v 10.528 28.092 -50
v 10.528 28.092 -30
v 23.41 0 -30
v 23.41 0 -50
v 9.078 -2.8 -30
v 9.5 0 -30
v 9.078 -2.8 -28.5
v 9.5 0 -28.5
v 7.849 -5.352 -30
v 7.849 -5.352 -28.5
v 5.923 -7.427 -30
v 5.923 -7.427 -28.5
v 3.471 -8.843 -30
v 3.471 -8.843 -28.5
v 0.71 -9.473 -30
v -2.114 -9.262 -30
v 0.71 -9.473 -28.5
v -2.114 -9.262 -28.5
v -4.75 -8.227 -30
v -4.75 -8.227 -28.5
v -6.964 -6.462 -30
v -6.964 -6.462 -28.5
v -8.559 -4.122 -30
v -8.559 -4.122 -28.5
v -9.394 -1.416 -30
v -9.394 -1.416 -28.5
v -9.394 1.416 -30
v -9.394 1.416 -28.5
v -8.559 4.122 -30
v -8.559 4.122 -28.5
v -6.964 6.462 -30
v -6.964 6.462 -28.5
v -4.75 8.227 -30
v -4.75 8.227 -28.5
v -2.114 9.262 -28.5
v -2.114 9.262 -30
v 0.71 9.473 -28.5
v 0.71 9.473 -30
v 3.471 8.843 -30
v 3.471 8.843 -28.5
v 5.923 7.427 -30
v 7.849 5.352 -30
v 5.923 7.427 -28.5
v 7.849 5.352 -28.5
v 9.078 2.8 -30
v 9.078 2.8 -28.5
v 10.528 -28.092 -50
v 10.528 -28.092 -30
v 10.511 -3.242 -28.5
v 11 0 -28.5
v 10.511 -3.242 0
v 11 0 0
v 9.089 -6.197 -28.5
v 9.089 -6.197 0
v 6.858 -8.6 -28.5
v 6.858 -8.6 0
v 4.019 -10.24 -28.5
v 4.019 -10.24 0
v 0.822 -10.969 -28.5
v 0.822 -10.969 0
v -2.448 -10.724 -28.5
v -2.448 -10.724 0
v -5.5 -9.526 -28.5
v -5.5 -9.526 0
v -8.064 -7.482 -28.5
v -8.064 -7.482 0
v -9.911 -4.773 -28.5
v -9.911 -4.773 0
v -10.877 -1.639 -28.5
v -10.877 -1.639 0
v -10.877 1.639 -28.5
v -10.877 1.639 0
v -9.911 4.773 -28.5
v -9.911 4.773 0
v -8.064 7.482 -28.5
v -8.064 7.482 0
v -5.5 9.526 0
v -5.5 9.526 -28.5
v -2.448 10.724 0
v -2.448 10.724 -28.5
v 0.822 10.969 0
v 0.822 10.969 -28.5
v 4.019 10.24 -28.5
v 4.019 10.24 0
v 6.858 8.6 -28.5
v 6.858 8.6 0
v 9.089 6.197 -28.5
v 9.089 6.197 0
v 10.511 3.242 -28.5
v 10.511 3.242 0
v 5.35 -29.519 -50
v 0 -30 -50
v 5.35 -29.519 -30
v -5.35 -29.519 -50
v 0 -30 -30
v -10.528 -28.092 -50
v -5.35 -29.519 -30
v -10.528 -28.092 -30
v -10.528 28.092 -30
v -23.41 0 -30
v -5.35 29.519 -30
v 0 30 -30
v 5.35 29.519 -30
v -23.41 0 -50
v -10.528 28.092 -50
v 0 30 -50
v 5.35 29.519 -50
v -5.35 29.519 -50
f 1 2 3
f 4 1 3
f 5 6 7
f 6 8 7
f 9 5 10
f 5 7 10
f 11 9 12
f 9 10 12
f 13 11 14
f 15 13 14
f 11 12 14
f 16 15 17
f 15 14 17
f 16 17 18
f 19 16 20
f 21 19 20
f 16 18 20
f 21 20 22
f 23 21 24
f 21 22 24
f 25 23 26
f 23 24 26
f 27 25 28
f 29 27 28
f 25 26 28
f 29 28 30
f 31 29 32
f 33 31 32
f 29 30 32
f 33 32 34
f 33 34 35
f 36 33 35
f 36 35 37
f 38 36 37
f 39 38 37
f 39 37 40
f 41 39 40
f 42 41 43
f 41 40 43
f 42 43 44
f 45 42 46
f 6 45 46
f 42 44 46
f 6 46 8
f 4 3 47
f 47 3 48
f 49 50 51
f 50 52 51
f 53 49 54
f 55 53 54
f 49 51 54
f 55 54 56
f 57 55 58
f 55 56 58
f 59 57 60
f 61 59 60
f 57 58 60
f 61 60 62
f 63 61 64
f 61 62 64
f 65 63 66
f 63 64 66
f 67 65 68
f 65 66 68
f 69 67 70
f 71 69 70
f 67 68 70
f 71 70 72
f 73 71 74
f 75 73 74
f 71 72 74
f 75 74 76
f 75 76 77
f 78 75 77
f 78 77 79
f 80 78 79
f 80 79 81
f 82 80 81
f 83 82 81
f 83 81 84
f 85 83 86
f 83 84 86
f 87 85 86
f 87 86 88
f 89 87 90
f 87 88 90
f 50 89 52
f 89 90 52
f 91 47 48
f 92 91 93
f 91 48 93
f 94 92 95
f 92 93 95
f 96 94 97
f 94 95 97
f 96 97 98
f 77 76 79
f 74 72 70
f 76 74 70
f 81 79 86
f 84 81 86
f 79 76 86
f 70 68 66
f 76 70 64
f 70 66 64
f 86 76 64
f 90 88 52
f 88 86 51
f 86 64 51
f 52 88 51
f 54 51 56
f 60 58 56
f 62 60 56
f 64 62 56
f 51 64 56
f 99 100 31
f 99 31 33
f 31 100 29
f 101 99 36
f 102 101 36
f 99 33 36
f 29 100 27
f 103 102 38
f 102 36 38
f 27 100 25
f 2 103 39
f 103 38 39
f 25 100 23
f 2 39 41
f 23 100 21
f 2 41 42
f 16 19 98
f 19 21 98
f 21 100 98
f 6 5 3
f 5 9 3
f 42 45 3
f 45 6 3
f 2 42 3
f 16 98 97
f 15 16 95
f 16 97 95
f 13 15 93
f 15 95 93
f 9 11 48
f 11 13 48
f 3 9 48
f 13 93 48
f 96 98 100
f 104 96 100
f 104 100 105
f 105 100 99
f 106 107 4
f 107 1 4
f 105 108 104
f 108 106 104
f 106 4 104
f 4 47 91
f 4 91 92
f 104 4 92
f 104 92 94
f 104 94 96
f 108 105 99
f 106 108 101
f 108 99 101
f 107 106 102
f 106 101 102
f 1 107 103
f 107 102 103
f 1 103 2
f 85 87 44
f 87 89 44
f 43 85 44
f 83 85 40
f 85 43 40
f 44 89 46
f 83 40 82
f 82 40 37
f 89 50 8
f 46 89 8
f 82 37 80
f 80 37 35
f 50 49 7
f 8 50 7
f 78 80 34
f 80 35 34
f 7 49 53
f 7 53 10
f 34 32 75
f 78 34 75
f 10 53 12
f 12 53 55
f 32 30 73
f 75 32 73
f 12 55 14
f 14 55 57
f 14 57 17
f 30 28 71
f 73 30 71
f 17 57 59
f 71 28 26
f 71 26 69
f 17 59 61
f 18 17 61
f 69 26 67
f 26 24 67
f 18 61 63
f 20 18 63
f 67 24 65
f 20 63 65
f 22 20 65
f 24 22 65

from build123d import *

# Parameters (mm, degrees)
CUT_EXTRUDE_START   = -30
SKETCH_2_R          = 36.239320701
CUT_EXTRUDE_1_DEPTH = 30


with BuildPart() as part:
    # 草图1 → 旋转1 (revolve)
    with BuildSketch(Plane(origin=(0, 0, 0), x_dir=(1, 0, 0), z_dir=(0, 1, 0))):
        Polygon((0, 0), (0, 50), (30, 50), (30, 30), (9.5, 30), (9.5, 28.5), (11, 28.5), (11, 0), align=None)
    revolve(axis=Axis((0, 0, 0), (0, 0, -1)))

    # 草图2 → 切除-拉伸1 (cut)
    with BuildSketch(Plane(origin=(0, 0, -50), x_dir=(-1, 0, 0), z_dir=(0, 0, -1)).offset(CUT_EXTRUDE_START)):
        Circle(SKETCH_2_R)
        with BuildLine():
            Line((-10.527630828, 28.092151736), (-23.409516673, 0))
            Line((-23.409516673, 0), (-10.527630828, -28.092151736))
            ThreePointArc((-10.527630828, -28.092151736), (0, -30), (10.527630828, -28.092151736))
            Line((10.527630828, -28.092151736), (23.409516673, 0))
            Line((23.409516673, 0), (10.527630828, 28.092151736))
            ThreePointArc((10.527630828, 28.092151736), (0, 30), (-10.527630828, 28.092151736))
        make_face(mode=Mode.SUBTRACT)
    extrude(amount=CUT_EXTRUDE_1_DEPTH, mode=Mode.SUBTRACT)


solid = part.part
